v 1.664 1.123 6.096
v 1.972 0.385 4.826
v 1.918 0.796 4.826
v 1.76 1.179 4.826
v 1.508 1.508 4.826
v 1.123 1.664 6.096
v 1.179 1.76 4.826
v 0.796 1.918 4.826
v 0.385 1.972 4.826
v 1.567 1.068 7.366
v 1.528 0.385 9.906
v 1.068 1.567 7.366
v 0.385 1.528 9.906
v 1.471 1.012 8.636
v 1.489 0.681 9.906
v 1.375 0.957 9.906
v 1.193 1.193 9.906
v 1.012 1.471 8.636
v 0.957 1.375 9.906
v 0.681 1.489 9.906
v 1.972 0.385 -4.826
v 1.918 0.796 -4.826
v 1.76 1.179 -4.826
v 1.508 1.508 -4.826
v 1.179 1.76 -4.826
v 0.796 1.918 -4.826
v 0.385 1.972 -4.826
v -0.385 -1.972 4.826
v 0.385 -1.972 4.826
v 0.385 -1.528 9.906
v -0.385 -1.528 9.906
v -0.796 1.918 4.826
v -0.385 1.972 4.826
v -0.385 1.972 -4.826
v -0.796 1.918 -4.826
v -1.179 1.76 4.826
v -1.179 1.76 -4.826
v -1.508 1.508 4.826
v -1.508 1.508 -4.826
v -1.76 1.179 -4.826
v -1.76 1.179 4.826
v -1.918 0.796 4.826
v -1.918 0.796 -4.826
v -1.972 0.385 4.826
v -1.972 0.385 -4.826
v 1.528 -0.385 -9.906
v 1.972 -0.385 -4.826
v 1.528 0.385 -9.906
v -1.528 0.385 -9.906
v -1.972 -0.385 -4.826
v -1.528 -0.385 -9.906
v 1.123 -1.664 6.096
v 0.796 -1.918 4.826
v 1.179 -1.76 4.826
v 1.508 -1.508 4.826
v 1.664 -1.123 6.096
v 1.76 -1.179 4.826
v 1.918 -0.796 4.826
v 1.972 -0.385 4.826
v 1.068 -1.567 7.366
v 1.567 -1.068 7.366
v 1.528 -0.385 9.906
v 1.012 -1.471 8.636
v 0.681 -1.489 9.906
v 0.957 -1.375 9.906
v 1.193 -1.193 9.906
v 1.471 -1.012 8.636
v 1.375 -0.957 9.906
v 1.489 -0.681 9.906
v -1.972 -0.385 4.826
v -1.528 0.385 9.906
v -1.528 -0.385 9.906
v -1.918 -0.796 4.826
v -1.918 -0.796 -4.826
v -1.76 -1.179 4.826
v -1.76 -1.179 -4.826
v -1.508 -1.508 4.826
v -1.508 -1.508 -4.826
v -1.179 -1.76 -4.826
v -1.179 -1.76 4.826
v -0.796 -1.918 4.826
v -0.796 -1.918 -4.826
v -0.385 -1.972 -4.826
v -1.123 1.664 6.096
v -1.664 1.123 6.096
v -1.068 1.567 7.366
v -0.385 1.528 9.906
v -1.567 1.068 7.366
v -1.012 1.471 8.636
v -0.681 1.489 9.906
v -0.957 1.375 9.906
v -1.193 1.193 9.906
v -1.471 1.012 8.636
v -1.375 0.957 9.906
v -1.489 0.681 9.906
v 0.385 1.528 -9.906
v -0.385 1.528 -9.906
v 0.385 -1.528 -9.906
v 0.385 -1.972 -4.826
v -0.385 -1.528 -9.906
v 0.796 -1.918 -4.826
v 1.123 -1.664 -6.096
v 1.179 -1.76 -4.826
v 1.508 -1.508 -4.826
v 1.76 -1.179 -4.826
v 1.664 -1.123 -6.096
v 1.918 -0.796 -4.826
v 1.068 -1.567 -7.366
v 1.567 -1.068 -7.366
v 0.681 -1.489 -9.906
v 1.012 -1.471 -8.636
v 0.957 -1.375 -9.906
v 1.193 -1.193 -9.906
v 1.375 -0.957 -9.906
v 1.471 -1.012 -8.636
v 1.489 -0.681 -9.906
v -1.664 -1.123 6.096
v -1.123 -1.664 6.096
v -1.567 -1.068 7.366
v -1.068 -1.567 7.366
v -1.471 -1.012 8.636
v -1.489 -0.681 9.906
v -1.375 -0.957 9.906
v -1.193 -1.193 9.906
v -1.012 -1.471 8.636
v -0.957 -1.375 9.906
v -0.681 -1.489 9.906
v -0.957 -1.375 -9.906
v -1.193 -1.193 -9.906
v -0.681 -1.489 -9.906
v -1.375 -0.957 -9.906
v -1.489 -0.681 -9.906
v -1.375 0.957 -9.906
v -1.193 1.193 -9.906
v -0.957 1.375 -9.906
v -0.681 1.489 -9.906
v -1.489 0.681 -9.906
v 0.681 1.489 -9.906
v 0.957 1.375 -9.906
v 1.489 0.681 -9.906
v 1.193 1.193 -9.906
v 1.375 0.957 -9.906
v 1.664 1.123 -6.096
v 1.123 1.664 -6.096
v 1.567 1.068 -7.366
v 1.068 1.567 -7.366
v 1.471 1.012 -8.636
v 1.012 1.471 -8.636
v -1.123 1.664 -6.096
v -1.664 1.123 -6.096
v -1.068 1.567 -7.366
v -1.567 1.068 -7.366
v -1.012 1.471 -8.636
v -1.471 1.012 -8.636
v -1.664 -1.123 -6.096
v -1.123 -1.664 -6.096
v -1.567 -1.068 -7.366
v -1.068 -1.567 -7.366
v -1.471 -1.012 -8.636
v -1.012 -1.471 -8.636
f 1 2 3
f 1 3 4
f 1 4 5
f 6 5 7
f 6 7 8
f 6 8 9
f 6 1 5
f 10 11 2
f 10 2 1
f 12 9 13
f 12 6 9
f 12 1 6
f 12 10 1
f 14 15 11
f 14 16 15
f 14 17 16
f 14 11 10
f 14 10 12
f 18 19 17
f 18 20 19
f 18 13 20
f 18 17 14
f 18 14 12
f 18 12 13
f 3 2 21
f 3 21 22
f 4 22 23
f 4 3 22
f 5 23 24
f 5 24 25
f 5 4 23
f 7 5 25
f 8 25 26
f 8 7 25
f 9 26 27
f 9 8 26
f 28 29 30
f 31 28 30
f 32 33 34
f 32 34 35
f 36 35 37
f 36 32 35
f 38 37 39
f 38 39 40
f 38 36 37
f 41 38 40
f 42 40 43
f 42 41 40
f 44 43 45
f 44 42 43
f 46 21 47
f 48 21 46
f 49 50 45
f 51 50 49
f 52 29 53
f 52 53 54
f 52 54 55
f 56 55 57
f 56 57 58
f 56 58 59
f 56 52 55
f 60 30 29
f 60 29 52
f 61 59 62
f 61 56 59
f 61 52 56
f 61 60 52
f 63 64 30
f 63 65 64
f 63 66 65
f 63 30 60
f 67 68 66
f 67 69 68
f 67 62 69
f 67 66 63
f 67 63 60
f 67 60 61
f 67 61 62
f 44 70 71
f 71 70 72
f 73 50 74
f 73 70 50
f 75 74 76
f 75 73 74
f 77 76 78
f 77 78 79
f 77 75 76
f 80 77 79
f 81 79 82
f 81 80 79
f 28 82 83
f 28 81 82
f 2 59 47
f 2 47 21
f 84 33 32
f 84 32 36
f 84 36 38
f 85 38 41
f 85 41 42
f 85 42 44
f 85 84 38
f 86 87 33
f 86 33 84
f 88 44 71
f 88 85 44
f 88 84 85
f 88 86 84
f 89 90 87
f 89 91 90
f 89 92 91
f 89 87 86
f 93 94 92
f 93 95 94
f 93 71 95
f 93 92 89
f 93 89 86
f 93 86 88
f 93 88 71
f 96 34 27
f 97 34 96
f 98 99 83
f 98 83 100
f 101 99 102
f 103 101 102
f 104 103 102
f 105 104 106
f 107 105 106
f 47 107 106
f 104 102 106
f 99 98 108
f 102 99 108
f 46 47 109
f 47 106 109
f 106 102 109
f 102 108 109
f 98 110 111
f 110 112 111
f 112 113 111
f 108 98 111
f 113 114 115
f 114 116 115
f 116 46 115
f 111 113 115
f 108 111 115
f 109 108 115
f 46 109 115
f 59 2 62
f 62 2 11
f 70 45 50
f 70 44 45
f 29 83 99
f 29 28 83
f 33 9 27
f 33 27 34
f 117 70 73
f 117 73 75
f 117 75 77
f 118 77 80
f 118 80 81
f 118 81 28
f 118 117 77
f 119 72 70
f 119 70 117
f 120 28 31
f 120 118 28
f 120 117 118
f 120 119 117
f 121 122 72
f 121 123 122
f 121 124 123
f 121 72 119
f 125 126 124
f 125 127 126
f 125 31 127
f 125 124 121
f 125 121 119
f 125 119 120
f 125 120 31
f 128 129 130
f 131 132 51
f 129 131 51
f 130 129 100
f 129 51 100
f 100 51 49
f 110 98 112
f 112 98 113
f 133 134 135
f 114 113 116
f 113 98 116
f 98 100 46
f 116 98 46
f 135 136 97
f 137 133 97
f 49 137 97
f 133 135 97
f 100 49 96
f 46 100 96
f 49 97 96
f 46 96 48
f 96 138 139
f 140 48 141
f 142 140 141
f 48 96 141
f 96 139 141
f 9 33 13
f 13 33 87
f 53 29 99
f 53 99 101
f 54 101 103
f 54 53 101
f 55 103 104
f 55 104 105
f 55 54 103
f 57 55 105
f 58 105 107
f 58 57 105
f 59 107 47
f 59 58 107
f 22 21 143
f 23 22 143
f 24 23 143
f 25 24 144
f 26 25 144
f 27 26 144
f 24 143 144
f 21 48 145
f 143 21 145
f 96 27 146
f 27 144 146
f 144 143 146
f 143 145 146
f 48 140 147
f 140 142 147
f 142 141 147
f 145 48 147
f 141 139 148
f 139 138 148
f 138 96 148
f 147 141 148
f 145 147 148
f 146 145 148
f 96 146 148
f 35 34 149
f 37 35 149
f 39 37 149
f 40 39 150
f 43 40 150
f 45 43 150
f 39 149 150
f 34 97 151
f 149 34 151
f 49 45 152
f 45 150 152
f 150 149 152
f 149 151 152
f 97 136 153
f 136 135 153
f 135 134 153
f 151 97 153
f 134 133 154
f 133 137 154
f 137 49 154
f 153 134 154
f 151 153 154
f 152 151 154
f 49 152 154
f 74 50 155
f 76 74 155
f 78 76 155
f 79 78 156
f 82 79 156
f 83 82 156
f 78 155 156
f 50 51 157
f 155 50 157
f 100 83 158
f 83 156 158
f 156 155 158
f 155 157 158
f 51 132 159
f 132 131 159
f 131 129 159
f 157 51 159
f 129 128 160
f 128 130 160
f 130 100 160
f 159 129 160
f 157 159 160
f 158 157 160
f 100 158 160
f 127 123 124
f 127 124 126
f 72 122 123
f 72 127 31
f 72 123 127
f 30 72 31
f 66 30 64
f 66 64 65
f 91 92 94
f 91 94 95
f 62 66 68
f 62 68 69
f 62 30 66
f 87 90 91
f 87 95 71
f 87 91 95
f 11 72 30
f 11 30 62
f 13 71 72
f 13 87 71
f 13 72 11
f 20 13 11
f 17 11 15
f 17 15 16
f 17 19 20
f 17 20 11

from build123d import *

# Parameters (mm, degrees)
BOSS_EXTRUDE1_DEPTH = 4.826
BOSS_EXTRUDE2_DEPTH = 5.08
BOSS_EXTRUDE2_TAPER = 5


with BuildPart() as part:
    # Sketch1 → Boss-Extrude1 (new body)
    with BuildSketch(Plane.XY):
        with BuildLine():
            Line((-0.385, -1.9725), (0.385, -1.9725))
            ThreePointArc((0.385, -1.9725), (1.507532015, -1.507532015), (1.9725, -0.385))
            Line((1.9725, -0.385), (1.9725, 0.385))
            ThreePointArc((1.9725, 0.385), (1.507532015, 1.507532015), (0.385, 1.9725))
            Line((0.385, 1.9725), (-0.385, 1.9725))
            ThreePointArc((-0.385, 1.9725), (-1.507532015, 1.507532015), (-1.9725, 0.385))
            Line((-1.9725, 0.385), (-1.9725, -0.385))
            ThreePointArc((-1.9725, -0.385), (-1.507532015, -1.507532015), (-0.385, -1.9725))
        make_face()
    boss_extrude1 = extrude(amount=BOSS_EXTRUDE1_DEPTH)

    # Sketch2 → Boss-Extrude2 (add)
    with BuildSketch(Plane.XY.offset(4.826)):
        with BuildLine():
            Line((1.9725, -0.385), (1.9725, 0.385))
            ThreePointArc((1.9725, 0.385), (1.507532015, 1.507532015), (0.385, 1.9725))
            Line((0.385, 1.9725), (-0.385, 1.9725))
            ThreePointArc((-0.385, 1.9725), (-1.507532015, 1.507532015), (-1.9725, 0.385))
            Line((-1.9725, 0.385), (-1.9725, -0.385))
            ThreePointArc((-1.9725, -0.385), (-1.507532015, -1.507532015), (-0.385, -1.9725))
            Line((-0.385, -1.9725), (0.385, -1.9725))
            ThreePointArc((0.385, -1.9725), (1.507532015, -1.507532015), (1.9725, -0.385))
        make_face()
    boss_extrude2 = extrude(amount=BOSS_EXTRUDE2_DEPTH, taper=BOSS_EXTRUDE2_TAPER)

    # Mirror1: Boss-Extrude1, Boss-Extrude2 across plane
    add(boss_extrude1.mirror(Plane.XY))
    add(boss_extrude2.mirror(Plane.XY))


solid = part.part
